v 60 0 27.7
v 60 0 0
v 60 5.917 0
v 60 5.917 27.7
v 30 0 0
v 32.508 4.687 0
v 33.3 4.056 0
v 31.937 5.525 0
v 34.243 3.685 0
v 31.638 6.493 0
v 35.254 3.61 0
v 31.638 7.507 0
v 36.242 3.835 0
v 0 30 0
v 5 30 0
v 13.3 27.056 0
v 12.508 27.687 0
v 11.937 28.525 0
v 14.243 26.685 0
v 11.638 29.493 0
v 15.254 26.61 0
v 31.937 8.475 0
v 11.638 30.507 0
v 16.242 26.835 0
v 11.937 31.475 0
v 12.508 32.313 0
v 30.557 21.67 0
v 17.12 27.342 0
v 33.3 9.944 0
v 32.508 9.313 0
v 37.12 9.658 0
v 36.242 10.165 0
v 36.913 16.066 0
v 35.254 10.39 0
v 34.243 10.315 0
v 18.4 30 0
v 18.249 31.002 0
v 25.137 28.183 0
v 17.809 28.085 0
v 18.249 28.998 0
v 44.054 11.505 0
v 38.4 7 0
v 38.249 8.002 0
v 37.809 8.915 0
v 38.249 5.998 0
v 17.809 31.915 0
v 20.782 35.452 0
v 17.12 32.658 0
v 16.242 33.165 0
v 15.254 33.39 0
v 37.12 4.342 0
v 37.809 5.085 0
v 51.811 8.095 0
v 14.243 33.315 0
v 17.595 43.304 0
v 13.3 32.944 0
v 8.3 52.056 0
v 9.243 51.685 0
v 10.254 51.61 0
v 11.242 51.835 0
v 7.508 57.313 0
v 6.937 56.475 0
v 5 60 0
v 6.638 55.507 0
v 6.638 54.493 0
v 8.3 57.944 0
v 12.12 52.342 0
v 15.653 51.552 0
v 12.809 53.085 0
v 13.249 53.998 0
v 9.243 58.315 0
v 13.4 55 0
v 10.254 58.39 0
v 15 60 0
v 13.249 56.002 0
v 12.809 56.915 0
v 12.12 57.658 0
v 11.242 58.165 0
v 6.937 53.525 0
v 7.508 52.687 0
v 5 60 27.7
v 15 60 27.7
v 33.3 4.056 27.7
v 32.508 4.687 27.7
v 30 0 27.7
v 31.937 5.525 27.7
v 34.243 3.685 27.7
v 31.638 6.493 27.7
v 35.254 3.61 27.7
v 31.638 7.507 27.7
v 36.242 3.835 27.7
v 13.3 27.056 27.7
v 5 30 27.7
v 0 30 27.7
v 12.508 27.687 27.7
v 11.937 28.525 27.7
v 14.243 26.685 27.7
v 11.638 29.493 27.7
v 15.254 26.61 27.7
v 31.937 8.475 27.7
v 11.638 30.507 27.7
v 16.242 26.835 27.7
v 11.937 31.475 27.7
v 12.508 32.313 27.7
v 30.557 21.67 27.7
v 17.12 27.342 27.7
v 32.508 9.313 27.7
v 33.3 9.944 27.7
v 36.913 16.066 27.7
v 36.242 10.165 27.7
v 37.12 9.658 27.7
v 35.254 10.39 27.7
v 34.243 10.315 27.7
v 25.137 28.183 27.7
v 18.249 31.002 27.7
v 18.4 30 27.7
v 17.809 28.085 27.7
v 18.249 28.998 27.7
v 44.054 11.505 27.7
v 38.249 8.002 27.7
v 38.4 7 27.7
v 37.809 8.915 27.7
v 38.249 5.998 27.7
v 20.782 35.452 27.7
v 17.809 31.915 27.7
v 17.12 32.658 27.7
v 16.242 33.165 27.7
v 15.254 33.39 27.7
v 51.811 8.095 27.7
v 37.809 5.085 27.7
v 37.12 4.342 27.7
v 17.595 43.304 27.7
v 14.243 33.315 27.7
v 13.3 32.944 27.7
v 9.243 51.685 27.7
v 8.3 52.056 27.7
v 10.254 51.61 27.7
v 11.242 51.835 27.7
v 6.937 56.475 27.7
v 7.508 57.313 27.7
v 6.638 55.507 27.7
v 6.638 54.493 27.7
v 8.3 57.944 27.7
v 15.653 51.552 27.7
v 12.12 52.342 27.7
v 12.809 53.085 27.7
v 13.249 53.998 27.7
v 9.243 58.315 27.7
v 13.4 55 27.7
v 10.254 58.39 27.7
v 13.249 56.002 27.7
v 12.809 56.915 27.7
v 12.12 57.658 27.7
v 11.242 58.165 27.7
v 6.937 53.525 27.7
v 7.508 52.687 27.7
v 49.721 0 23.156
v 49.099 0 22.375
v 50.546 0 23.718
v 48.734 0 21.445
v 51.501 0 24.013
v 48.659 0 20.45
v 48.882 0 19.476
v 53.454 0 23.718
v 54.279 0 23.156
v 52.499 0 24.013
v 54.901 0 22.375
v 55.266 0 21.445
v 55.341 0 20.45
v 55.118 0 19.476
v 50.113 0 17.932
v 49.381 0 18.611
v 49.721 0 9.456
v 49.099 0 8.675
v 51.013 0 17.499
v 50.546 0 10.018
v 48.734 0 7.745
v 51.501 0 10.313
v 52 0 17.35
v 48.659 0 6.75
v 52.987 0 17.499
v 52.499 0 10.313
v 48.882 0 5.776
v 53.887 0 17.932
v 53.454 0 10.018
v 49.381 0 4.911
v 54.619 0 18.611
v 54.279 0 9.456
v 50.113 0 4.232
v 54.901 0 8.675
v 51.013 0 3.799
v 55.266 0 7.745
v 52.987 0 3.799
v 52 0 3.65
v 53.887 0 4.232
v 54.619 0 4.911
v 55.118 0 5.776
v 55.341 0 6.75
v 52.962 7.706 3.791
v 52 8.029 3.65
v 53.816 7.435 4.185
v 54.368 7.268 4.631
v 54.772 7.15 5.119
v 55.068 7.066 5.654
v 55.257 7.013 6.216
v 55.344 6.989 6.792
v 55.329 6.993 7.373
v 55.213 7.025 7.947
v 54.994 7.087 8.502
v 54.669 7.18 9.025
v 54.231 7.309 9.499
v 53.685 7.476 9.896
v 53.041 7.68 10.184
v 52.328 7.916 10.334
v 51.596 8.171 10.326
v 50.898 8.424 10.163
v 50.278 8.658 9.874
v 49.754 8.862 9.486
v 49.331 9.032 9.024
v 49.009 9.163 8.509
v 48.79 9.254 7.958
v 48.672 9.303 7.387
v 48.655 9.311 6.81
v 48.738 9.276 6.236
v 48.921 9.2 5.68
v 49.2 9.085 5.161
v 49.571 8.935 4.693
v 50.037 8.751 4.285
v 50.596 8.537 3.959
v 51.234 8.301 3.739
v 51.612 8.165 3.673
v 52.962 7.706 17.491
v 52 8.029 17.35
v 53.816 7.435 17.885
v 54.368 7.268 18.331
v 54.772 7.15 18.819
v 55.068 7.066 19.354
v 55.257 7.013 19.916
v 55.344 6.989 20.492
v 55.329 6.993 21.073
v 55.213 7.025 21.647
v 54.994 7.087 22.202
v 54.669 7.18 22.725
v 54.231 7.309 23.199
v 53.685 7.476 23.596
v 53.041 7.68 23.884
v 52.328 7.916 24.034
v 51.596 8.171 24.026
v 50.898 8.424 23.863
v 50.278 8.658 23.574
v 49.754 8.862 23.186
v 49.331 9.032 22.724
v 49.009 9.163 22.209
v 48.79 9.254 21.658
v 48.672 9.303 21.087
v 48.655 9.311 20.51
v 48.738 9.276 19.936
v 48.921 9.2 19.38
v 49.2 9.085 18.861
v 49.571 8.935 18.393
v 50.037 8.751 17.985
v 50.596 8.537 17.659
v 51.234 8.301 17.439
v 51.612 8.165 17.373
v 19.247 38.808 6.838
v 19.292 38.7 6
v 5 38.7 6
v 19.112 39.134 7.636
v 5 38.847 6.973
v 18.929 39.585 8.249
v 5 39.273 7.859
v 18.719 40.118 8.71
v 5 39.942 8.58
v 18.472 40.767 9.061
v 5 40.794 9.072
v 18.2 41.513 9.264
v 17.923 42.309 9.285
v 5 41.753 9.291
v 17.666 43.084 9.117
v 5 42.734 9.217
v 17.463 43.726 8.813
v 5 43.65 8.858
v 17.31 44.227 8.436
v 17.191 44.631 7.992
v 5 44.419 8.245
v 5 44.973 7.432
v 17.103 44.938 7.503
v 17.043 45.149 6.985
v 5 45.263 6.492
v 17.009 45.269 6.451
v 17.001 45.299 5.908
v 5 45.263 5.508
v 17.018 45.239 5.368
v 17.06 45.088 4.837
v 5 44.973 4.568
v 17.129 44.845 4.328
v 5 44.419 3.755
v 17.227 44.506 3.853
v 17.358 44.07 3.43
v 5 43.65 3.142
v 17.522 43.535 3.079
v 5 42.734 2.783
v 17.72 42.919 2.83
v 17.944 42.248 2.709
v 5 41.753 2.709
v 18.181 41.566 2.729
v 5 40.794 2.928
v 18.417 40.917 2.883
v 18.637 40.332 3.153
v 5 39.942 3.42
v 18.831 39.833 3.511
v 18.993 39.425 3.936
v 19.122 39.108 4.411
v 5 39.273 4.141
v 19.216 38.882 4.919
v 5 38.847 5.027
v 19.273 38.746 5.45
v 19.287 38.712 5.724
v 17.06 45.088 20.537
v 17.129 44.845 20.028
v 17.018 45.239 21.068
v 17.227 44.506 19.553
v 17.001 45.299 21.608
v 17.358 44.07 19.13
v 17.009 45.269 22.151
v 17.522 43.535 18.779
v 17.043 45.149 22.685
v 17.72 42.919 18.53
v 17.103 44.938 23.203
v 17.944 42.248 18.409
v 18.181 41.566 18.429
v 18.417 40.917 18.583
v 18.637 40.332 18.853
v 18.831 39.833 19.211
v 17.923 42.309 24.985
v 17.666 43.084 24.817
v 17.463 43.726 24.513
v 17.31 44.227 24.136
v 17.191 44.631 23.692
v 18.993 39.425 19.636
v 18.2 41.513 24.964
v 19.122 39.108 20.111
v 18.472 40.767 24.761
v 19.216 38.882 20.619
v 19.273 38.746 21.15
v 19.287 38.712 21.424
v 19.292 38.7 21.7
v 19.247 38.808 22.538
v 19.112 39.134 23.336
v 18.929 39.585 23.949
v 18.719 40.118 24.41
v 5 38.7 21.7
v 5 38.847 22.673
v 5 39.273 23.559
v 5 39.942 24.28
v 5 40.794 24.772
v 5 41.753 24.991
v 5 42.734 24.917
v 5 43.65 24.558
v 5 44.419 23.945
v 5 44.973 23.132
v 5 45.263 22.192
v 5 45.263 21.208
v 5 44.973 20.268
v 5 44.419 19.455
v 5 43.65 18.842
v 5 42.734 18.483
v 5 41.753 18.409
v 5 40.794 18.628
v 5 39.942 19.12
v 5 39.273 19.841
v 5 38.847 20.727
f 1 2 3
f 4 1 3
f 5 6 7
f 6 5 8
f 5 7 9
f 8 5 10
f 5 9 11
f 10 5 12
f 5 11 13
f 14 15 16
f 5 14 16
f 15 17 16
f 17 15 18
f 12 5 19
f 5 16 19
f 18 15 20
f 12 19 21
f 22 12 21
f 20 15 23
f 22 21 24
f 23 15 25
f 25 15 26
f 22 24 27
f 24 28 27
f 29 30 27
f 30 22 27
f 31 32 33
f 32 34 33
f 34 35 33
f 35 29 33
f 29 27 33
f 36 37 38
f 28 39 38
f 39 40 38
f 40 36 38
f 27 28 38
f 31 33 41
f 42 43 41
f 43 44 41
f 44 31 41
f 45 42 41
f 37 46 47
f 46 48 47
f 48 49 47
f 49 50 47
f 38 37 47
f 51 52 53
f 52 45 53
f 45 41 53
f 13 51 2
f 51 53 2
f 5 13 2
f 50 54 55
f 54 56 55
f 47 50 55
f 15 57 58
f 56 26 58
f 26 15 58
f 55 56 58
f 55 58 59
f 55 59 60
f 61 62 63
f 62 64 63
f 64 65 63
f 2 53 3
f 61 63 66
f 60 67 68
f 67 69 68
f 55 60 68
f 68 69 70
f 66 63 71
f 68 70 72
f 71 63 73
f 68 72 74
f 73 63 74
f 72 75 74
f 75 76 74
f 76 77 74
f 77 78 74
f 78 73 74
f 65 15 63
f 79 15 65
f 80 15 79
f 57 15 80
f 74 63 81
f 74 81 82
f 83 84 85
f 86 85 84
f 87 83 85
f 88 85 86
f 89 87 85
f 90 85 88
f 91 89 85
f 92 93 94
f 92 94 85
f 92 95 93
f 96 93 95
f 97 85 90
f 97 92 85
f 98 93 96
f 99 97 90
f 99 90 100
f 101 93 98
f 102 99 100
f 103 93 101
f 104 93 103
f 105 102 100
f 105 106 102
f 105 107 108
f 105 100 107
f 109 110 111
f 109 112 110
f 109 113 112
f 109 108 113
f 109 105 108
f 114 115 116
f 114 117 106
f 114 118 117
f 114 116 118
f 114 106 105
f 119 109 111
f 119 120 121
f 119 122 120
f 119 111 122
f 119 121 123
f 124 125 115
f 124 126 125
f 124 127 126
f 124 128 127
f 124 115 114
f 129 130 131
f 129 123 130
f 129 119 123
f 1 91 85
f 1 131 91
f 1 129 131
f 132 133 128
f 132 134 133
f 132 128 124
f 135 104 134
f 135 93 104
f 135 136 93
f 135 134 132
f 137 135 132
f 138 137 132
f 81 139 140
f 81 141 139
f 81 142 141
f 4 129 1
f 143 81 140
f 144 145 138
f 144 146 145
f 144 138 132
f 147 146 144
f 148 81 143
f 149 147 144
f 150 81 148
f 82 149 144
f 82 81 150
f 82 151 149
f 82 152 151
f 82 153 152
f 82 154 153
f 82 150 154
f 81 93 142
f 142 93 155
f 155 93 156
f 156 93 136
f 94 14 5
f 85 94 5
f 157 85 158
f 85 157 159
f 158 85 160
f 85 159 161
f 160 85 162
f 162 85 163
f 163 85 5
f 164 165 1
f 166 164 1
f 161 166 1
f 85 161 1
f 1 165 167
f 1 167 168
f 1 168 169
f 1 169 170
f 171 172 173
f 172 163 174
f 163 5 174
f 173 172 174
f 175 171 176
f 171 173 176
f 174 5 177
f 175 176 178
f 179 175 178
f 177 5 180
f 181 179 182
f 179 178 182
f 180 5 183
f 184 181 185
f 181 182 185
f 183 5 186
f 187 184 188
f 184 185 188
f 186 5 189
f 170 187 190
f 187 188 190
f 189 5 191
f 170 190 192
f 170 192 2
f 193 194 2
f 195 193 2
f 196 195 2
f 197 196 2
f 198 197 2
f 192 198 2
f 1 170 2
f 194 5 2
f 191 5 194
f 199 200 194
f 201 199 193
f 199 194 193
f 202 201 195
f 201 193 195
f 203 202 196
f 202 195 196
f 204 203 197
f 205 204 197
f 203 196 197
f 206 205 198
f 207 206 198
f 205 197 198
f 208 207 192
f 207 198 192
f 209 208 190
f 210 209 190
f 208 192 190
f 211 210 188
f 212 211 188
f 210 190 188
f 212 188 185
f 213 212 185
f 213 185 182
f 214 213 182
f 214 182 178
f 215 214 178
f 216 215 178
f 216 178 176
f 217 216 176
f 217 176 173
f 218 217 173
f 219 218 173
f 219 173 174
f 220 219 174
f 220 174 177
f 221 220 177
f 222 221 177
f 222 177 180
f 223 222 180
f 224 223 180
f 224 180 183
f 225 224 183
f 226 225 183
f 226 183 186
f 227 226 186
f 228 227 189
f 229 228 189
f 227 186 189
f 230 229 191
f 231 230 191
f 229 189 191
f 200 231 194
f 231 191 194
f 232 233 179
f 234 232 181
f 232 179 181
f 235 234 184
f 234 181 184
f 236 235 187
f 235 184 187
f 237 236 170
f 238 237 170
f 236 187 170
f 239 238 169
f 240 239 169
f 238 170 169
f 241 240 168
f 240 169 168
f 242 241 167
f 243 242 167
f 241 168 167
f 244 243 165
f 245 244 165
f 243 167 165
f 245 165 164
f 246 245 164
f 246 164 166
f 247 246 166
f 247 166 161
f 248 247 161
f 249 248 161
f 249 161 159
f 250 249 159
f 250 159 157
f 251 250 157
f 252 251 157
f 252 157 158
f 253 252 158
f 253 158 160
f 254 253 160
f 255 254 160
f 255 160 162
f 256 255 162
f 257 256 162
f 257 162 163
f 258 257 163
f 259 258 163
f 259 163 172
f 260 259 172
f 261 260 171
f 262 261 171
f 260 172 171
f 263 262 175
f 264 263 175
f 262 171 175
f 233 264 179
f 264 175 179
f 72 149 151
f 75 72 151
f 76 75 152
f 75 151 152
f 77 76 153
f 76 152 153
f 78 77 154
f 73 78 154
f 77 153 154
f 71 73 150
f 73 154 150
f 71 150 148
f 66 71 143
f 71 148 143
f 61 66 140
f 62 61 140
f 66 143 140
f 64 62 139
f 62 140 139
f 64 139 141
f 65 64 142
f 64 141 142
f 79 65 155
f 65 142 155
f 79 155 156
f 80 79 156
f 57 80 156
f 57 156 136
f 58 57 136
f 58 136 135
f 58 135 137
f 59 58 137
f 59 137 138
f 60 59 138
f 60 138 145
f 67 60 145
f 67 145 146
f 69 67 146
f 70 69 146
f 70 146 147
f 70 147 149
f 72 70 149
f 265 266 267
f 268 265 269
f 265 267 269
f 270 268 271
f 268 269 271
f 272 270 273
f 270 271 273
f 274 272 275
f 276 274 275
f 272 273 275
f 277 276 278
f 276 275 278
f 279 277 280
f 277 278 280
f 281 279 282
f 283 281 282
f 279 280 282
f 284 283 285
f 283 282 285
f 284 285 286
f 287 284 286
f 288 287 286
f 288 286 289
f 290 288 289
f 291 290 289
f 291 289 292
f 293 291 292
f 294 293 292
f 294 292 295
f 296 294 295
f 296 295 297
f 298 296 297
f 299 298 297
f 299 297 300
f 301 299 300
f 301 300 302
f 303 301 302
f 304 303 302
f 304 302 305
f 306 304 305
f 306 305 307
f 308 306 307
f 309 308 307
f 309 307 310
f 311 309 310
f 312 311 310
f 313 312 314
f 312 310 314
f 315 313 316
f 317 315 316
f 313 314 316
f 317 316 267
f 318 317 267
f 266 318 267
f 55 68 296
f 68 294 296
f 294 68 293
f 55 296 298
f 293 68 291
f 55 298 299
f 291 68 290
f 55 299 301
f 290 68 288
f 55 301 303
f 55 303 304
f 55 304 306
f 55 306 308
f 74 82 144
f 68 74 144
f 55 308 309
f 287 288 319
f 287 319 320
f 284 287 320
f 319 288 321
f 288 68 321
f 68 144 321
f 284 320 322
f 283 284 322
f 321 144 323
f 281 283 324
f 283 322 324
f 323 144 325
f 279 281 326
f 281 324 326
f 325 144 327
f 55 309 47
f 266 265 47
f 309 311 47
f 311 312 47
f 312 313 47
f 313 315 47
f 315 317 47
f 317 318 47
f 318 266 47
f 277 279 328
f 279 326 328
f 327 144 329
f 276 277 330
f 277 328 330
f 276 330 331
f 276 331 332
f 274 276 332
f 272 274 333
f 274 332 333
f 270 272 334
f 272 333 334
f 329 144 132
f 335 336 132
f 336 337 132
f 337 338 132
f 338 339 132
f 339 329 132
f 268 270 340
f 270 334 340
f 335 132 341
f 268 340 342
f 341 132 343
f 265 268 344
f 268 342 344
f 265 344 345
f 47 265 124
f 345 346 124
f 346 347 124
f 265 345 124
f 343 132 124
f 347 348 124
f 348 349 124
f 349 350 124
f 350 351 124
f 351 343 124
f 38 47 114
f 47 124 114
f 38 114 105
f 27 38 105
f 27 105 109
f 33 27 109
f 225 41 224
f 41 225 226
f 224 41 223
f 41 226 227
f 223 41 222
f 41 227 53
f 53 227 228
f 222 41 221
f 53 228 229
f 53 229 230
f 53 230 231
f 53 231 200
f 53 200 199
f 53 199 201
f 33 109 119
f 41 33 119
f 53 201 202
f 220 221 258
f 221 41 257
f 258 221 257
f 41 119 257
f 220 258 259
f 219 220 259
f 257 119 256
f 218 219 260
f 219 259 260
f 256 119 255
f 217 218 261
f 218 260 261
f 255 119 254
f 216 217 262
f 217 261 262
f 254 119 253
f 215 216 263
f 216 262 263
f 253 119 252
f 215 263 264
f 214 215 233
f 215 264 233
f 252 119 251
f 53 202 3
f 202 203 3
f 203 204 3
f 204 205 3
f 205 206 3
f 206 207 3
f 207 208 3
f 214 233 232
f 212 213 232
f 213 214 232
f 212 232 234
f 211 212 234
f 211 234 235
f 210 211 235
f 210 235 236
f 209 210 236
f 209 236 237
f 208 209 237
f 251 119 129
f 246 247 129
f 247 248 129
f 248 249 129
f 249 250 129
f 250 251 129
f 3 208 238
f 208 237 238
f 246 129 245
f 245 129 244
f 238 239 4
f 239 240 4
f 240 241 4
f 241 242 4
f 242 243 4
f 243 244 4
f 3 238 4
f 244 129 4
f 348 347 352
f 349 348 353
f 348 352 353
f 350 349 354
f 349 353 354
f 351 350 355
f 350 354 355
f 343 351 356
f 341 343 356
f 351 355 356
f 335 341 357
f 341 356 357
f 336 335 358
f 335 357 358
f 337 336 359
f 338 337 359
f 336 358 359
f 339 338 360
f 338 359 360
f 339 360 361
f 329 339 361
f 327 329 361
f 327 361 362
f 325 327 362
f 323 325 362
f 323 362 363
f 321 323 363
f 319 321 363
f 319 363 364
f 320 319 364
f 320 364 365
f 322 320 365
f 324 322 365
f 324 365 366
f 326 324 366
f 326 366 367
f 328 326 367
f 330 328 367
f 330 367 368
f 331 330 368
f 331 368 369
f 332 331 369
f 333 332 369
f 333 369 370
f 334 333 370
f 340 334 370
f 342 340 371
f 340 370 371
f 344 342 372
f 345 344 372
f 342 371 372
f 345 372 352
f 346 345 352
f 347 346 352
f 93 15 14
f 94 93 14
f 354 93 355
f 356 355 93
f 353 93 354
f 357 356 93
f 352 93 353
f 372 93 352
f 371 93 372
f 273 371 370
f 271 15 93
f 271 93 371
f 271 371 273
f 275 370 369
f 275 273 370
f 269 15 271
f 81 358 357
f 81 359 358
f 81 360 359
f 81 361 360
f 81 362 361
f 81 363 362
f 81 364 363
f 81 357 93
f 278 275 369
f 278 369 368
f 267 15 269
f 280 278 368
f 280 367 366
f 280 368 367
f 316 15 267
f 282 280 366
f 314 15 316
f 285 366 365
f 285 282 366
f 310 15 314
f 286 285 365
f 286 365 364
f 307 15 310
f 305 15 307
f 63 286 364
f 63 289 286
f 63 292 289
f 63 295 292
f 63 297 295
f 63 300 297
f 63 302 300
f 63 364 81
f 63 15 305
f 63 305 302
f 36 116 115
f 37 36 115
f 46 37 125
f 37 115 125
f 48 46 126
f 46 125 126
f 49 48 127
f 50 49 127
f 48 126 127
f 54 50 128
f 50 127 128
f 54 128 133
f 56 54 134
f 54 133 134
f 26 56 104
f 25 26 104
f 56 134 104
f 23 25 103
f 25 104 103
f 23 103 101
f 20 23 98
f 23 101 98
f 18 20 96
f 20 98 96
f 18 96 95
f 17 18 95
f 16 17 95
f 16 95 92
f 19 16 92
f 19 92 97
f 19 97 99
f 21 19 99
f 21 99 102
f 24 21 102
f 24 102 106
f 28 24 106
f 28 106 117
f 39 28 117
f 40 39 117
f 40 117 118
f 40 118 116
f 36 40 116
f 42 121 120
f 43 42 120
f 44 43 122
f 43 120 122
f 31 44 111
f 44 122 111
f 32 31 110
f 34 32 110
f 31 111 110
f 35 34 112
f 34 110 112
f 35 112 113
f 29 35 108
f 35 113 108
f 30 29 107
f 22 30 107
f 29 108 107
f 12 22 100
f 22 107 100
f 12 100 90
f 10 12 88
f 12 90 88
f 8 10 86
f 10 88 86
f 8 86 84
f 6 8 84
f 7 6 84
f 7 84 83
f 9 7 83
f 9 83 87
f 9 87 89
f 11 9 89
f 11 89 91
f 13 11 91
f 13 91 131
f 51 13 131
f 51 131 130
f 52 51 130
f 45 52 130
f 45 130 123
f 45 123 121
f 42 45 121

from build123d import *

# Parameters (mm, degrees)
SKETCH_1_W          = 30
SKETCH_1_H          = 30
SKETCH_1_W_2        = 25
EXTRUDE_1_DEPTH     = 27.7
SKETCH_3_R          = 55
CUT_EXTRUDE_1_DEPTH = 40
SKETCH_4_R          = 3.4
CUT_EXTRUDE_2_DEPTH = 90.259677346
SKETCH_5_R          = 3.3
CUT_EXTRUDE_3_DEPTH = 86.978427527
SKETCH_6_R          = 3.35
CUT_EXTRUDE_4_DEPTH = 90.259677512


with BuildPart() as part:
    # 草图1 → 凸台-拉伸1 (new body)
    with BuildSketch(Plane.XY):
        Polygon((0, 30), (30, 0), (30, 30), align=None)
        with Locations((45, 15)):
            Rectangle(SKETCH_1_W, SKETCH_1_H)
        with Locations((17.5, 45)):
            Rectangle(SKETCH_1_W_2, SKETCH_1_H)
    extrude(amount=EXTRUDE_1_DEPTH)

    # 草图3 → 切除-拉伸1 (cut)
    with BuildSketch(Plane.XY.offset(27.7)):
        with Locations((70, 60)):
            Circle(SKETCH_3_R)
    extrude(amount=-CUT_EXTRUDE_1_DEPTH, mode=Mode.SUBTRACT)

    # 草图4 → 切除-拉伸2 (cut, through all)
    with BuildSketch(Plane.XY.offset(27.7)):
        with Locations((35, 7)):
            Circle(SKETCH_4_R)
        with Locations((10, 55)):
            Circle(SKETCH_4_R)
        with Locations((15, 30)):
            Circle(SKETCH_4_R)
    extrude(amount=-CUT_EXTRUDE_2_DEPTH, mode=Mode.SUBTRACT)

    # 草图5 → 切除-拉伸3 (cut, through all)
    with BuildSketch(Plane.ZY.offset(-5)):
        with Locations(Location((6, 42, 0), (0, 0, 270))):
            Circle(SKETCH_5_R)
        with Locations(Location((21.7, 42, 0), (0, 0, 270))):
            Circle(SKETCH_5_R)
    extrude(amount=-CUT_EXTRUDE_3_DEPTH, mode=Mode.SUBTRACT)

    # 草图6 → 切除-拉伸4 (cut, through all)
    with BuildSketch(Plane.XZ):
        with Locations(Location((52, 20.7, 0), (0, 0, 270))):
            Circle(SKETCH_6_R)
        with Locations(Location((52, 7, 0), (0, 0, 270))):
            Circle(SKETCH_6_R)
    extrude(amount=-CUT_EXTRUDE_4_DEPTH, mode=Mode.SUBTRACT)


solid = part.part
